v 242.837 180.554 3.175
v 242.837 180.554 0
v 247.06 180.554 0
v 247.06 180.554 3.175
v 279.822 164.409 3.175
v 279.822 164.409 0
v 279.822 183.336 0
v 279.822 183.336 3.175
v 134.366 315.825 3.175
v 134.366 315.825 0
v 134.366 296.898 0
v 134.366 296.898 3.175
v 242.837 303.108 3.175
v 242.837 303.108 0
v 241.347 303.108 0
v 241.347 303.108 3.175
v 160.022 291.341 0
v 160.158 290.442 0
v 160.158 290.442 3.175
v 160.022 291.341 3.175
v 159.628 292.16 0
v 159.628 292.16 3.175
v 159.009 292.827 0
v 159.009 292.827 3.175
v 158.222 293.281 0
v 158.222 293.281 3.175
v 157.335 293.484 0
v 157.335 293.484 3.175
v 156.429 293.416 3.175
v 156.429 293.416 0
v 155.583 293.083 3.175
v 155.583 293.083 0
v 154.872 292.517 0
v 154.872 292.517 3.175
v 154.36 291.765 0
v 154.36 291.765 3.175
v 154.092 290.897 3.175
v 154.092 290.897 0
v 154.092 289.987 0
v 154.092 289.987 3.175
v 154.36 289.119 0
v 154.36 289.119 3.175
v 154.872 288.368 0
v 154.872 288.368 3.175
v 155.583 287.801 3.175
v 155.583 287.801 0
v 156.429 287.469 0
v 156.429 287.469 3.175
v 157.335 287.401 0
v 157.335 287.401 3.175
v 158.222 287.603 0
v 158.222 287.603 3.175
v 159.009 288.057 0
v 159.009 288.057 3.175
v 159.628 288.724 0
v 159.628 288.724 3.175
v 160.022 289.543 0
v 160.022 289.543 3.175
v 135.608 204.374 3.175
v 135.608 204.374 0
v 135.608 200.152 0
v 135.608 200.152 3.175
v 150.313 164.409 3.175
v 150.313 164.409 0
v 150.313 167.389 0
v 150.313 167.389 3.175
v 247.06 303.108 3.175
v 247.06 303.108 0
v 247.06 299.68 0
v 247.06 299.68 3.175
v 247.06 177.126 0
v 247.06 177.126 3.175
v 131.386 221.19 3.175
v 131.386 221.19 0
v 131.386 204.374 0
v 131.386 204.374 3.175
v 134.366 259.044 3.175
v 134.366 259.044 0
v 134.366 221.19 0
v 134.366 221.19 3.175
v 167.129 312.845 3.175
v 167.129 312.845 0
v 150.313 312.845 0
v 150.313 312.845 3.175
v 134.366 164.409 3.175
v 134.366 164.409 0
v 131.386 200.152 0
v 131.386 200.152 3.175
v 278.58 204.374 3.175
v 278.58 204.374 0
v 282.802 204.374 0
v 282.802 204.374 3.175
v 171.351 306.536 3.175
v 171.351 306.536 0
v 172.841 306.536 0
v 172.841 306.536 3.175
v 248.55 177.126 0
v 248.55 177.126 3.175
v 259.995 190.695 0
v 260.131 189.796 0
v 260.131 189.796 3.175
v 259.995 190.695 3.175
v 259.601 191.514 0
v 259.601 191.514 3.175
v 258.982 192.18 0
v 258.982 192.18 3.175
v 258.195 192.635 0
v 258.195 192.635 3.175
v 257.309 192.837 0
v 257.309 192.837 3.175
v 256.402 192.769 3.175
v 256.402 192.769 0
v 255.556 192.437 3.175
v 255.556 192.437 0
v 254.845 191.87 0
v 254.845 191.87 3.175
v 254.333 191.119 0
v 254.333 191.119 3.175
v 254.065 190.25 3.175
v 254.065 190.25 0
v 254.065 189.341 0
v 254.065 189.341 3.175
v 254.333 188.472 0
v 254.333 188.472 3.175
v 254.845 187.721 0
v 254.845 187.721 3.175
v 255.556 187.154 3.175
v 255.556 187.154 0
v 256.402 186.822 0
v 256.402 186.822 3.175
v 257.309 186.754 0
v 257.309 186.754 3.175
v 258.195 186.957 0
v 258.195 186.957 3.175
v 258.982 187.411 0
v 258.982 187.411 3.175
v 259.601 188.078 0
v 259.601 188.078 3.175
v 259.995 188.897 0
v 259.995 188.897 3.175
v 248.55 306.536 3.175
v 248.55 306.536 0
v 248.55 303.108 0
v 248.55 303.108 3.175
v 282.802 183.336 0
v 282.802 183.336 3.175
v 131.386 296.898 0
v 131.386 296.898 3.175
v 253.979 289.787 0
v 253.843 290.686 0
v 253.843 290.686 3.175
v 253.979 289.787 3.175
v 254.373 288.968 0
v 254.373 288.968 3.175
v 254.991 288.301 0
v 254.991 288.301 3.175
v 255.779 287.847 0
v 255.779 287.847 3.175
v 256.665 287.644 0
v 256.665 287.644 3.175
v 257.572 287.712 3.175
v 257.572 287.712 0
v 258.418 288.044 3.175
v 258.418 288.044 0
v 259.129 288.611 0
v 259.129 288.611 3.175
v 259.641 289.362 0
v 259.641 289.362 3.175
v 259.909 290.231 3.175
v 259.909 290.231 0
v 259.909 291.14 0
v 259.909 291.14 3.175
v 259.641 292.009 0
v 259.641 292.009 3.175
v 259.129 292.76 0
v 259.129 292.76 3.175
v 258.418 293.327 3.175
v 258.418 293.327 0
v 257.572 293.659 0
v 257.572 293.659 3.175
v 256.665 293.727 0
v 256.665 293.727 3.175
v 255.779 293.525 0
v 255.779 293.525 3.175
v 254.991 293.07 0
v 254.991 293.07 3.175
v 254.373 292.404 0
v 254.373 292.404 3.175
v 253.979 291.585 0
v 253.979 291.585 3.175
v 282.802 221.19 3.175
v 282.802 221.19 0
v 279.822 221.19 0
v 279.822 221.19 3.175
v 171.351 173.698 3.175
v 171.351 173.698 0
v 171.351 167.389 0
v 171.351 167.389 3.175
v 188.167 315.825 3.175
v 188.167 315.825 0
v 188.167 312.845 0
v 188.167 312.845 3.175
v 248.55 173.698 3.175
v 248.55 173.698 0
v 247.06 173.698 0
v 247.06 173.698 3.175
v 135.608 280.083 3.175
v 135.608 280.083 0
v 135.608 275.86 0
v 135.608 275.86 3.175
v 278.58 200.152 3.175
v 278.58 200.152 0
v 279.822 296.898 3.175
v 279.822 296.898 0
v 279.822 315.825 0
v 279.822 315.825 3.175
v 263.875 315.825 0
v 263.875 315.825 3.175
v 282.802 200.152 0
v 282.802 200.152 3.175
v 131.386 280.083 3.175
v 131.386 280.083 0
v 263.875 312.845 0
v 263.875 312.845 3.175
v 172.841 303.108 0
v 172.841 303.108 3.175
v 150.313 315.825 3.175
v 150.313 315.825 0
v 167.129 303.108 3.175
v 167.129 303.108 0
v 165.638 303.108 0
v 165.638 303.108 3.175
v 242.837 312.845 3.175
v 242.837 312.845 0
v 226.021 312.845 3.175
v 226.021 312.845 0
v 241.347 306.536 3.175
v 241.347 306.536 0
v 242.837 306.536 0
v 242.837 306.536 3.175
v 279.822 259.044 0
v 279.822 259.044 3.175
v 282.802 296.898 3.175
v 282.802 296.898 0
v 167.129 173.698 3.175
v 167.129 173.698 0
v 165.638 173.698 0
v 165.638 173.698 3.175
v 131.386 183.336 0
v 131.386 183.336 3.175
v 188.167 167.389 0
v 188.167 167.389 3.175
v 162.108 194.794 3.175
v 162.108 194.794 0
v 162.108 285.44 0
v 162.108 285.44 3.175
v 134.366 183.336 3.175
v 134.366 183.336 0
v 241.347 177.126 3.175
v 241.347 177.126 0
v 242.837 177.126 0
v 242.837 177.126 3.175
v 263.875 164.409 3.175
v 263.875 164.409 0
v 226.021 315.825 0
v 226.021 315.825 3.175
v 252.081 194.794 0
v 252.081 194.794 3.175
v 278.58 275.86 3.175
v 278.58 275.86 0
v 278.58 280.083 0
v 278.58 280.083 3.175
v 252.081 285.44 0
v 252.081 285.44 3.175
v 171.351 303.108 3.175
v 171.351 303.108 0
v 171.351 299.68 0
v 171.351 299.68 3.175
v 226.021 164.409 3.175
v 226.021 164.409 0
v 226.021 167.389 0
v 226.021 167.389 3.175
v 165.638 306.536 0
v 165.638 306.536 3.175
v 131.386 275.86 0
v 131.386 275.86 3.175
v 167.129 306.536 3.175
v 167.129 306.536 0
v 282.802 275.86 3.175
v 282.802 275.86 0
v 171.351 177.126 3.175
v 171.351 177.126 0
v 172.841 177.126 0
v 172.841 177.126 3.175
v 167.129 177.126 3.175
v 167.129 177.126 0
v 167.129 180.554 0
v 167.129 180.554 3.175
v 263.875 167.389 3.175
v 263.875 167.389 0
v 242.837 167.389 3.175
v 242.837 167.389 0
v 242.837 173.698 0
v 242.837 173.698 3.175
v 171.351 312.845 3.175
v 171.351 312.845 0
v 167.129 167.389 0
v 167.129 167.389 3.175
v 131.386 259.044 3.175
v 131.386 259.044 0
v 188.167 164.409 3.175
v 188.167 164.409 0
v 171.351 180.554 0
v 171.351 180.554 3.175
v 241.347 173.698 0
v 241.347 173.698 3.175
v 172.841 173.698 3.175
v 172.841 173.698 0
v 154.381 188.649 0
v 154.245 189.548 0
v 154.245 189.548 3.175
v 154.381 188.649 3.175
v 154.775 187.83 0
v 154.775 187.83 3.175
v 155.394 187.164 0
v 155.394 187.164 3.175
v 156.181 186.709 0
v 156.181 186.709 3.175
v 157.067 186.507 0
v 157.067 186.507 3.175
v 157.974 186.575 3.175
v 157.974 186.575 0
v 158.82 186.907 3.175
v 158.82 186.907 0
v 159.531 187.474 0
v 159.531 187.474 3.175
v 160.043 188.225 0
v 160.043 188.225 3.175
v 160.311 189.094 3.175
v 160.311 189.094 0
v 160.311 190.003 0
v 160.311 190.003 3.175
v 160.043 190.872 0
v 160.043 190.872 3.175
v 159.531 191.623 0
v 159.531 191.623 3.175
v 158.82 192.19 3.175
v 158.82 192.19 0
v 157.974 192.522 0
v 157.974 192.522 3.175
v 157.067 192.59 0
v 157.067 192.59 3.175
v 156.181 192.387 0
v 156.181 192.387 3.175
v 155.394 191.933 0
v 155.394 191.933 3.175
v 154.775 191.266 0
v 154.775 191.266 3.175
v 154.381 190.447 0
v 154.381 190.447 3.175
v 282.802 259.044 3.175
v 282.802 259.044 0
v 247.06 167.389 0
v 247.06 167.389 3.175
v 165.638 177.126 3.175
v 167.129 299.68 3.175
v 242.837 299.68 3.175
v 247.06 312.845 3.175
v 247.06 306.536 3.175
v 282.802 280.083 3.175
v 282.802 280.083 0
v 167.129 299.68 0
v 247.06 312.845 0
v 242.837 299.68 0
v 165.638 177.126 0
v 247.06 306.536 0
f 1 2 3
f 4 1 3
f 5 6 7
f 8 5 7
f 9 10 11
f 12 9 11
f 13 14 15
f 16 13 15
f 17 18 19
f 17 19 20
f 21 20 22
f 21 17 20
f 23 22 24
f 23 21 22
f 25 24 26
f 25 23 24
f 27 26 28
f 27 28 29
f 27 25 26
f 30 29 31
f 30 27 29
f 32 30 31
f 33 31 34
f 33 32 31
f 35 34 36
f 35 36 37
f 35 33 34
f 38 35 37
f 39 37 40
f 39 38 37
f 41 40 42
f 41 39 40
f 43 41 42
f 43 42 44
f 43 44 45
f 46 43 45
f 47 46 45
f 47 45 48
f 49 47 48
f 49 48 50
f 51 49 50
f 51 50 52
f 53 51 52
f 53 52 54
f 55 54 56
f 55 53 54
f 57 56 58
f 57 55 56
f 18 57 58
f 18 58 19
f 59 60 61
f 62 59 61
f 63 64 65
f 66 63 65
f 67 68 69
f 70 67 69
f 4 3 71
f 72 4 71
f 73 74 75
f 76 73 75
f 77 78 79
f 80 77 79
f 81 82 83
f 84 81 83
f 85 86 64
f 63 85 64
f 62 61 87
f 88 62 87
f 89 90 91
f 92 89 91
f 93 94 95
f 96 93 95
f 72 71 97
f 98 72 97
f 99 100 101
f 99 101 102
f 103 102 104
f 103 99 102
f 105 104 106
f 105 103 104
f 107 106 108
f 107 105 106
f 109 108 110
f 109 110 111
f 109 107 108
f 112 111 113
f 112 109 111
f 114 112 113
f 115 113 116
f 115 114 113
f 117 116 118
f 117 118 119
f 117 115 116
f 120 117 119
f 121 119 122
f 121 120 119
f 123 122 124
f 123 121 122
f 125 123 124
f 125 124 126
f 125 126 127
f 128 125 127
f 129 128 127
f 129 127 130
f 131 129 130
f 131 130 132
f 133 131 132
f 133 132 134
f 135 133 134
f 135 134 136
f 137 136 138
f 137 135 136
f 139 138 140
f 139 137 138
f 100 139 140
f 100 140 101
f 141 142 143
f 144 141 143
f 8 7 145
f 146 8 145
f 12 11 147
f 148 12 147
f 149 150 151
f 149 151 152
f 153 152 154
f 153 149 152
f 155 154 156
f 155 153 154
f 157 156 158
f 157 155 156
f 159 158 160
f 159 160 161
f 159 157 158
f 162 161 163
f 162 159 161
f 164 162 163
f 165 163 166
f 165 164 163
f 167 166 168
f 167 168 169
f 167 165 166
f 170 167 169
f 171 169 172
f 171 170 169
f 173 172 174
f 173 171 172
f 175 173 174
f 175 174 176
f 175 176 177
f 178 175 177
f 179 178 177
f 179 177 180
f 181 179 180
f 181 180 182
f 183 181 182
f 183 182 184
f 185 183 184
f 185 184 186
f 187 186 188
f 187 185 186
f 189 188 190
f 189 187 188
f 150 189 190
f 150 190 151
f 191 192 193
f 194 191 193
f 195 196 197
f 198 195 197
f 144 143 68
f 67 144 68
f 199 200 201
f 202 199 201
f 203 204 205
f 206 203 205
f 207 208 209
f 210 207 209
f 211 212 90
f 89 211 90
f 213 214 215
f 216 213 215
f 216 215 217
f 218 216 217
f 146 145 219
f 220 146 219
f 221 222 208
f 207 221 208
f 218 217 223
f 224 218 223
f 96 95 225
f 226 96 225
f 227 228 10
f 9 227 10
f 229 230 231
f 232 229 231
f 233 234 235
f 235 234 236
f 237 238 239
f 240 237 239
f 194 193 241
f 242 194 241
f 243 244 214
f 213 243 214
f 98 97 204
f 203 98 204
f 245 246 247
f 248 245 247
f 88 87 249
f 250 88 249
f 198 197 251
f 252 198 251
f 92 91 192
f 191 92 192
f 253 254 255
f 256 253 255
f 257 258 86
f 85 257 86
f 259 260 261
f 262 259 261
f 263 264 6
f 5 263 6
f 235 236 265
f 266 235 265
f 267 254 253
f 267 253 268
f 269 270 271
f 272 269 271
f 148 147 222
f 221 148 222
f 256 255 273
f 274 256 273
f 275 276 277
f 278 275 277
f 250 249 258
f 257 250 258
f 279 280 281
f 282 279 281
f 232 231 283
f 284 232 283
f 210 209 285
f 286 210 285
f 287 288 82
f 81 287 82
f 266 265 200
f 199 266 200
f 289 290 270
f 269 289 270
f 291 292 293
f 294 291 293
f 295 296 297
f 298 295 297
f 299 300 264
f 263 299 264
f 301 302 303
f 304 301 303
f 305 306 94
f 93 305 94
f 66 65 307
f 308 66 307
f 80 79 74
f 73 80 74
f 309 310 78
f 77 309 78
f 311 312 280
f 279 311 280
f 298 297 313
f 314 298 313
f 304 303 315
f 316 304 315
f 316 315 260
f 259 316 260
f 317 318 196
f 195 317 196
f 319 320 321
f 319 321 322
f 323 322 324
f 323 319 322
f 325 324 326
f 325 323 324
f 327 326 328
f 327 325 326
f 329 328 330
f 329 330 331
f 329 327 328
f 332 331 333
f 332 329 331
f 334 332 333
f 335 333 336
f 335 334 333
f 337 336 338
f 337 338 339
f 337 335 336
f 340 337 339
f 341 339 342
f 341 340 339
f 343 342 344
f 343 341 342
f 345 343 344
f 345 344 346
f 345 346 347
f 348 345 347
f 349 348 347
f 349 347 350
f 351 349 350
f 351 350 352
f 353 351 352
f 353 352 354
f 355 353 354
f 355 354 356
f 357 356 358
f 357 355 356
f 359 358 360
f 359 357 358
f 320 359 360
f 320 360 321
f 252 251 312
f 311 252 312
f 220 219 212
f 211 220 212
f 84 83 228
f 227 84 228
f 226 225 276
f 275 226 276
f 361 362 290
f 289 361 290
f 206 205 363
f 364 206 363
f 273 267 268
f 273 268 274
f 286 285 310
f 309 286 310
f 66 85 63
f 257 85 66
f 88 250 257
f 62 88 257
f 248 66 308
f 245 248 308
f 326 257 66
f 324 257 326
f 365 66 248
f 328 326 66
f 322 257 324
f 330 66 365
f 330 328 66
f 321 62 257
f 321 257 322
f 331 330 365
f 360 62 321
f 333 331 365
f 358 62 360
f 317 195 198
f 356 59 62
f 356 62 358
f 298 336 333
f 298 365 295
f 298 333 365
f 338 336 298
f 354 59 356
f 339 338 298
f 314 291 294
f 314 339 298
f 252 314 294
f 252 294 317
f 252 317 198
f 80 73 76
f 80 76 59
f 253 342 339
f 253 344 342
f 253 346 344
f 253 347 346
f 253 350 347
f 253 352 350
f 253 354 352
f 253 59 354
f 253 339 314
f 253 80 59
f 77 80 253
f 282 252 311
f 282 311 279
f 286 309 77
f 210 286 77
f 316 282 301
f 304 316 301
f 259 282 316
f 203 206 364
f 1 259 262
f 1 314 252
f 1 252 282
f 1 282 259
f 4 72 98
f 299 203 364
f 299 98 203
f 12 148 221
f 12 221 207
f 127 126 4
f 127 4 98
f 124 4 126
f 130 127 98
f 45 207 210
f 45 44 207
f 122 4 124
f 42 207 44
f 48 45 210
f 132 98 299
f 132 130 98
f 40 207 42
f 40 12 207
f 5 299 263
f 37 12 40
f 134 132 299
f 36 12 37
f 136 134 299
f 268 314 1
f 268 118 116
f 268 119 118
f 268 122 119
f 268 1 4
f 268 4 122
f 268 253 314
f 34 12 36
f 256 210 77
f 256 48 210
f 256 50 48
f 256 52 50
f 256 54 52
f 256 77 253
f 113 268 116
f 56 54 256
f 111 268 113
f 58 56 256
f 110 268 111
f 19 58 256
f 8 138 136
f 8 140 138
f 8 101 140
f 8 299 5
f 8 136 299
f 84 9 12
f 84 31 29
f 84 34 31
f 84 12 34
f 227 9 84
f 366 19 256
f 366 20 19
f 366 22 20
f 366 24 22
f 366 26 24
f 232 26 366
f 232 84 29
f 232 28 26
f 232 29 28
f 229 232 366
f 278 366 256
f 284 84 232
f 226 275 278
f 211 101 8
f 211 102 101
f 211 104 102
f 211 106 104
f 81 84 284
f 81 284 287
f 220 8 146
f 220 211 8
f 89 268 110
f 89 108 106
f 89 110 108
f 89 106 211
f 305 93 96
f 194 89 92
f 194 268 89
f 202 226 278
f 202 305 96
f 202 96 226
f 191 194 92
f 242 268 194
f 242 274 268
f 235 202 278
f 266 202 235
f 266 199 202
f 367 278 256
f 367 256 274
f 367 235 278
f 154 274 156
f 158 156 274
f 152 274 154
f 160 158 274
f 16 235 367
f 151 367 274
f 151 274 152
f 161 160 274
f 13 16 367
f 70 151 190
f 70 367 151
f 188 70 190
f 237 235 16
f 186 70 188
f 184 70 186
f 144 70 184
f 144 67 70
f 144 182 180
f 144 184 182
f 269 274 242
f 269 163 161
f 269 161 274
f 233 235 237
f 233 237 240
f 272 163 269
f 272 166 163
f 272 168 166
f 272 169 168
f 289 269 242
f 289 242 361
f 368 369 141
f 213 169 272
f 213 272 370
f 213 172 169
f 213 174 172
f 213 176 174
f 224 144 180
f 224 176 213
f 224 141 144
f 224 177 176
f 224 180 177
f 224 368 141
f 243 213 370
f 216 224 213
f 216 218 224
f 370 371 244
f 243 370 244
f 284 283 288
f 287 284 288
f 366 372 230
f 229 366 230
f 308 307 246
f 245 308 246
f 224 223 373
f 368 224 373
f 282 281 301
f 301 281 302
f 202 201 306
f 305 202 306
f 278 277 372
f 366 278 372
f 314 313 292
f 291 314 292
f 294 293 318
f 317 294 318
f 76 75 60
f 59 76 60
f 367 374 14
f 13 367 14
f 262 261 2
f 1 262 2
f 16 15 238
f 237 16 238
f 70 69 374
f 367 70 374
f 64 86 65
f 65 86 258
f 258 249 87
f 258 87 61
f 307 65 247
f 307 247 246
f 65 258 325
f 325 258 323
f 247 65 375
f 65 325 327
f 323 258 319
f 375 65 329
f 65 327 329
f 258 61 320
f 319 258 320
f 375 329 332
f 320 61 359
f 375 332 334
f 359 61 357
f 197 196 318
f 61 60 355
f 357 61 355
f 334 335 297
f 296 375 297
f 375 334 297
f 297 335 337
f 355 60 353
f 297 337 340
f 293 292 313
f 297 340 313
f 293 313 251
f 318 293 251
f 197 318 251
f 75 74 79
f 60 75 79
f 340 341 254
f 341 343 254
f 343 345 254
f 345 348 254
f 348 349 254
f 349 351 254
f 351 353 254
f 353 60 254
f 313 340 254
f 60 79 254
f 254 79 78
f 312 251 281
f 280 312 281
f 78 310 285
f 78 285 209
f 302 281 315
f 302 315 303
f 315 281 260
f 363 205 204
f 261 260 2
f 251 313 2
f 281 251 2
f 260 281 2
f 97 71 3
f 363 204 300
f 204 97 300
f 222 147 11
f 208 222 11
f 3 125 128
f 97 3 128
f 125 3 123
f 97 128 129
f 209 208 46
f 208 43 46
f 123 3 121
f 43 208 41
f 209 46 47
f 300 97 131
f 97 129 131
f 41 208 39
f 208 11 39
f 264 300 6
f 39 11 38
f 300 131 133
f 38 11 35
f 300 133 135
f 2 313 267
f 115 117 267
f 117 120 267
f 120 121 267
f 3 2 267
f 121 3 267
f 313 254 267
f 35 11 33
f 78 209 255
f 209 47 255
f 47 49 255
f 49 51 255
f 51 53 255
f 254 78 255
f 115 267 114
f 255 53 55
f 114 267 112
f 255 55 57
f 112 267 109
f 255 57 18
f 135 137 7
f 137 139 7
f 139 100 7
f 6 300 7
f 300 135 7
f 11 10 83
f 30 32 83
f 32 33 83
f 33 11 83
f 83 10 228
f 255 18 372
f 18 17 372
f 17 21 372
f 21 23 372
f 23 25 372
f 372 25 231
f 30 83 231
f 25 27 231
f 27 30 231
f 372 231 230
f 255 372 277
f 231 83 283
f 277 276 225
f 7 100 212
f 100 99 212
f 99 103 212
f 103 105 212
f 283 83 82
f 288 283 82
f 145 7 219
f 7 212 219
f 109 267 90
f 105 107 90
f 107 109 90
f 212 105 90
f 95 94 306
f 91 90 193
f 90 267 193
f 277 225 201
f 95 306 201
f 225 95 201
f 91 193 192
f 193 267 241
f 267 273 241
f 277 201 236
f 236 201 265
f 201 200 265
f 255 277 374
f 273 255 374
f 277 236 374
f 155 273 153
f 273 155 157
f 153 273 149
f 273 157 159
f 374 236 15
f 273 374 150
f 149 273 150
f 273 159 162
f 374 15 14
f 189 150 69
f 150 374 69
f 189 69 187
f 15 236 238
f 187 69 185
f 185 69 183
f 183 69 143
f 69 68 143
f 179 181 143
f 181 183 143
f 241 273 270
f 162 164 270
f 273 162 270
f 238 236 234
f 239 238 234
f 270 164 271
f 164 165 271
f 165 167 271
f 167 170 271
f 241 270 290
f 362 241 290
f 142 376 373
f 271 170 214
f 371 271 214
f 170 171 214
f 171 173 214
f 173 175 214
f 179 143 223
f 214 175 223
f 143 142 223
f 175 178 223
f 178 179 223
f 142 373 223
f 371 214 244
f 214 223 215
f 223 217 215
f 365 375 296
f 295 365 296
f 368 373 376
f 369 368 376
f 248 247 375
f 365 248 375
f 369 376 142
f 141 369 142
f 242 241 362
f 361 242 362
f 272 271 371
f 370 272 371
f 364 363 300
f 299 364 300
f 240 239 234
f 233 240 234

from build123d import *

# Parameters (mm, degrees)
SKETCH1_R           = 3.05
SKETCH1_W           = 89.973098966
SKETCH1_H           = 90.646237781
BOSS_EXTRUDE1_DEPTH = 3.175


with BuildPart() as part:
    # Sketch1 → Boss-Extrude1 (new body)
    with BuildSketch(Plane.XY):
        Polygon((134.366277122, 315.825463089), (134.366277122, 296.898356199), (131.385630367, 296.898356199), (131.385630367, 280.082540759), (135.608213269, 280.082540759), (135.608213269, 277.971249308), (135.608213269, 275.859957857), (131.385630367, 275.859957857), (131.385630367, 259.044142417), (134.366277122, 259.044142417), (134.366277122, 221.189928636), (131.385630367, 221.189928636), (131.385630367, 204.374113196), (135.608213269, 204.374113196), (135.608213269, 202.262821745), (135.608213269, 200.151530294), (131.385630367, 200.151530294), (131.385630367, 183.335714854), (134.366277122, 183.335714854), (134.366277122, 164.408607964), (150.312737258, 164.408607964), (150.312737258, 167.389254718), (167.128552698, 167.389254718), (167.128552698, 173.698290348), (165.63822932, 173.698290348), (165.63822932, 177.126034116), (167.128552698, 177.126034116), (167.128552698, 180.553777884), (171.3511356, 180.553777884), (171.3511356, 177.126034116), (172.841458977, 177.126034116), (172.841458977, 173.698290348), (171.3511356, 173.698290348), (171.3511356, 167.389254718), (188.166951039, 167.389254718), (188.166951039, 164.408607964), (226.021164821, 164.408607964), (226.021164821, 167.389254718), (242.83698026, 167.389254718), (242.83698026, 173.698290348), (241.346656883, 173.698290348), (241.346656883, 177.126034116), (242.83698026, 177.126034116), (242.83698026, 180.553777884), (247.059563162, 180.553777884), (247.059563162, 177.126034116), (248.54988654, 177.126034116), (248.54988654, 173.698290348), (247.059563162, 173.698290348), (247.059563162, 167.389254718), (263.875378602, 167.389254718), (263.875378602, 164.408607964), (279.821838738, 164.408607964), (279.821838738, 183.335714854), (282.802485493, 183.335714854), (282.802485493, 200.151530294), (278.579902591, 200.151530294), (278.579902591, 202.262821745), (278.579902591, 204.374113196), (282.802485493, 204.374113196), (282.802485493, 221.189928636), (279.821838738, 221.189928636), (279.821838738, 259.044142417), (282.802485493, 259.044142417), (282.802485493, 275.859957857), (278.579902591, 275.859957857), (278.579902591, 277.971249308), (278.579902591, 280.082540759), (282.802485493, 280.082540759), (282.802485493, 296.898356199), (279.821838738, 296.898356199), (279.821838738, 315.825463089), (263.875378602, 315.825463089), (263.875378602, 312.844816335), (247.059563162, 312.844816335), (247.059563162, 306.535780705), (248.54988654, 306.535780705), (248.54988654, 303.108036937), (247.059563162, 303.108036937), (247.059563162, 299.680293169), (242.83698026, 299.680293169), (242.83698026, 303.108036937), (241.346656883, 303.108036937), (241.346656883, 306.535780705), (242.83698026, 306.535780705), (242.83698026, 312.844816335), (226.021164821, 312.844816335), (226.021164821, 315.825463089), (188.166951039, 315.825463089), (188.166951039, 312.844816335), (171.3511356, 312.844816335), (171.3511356, 306.535780705), (172.841458977, 306.535780705), (172.841458977, 303.108036937), (171.3511356, 303.108036937), (171.3511356, 299.680293169), (167.128552698, 299.680293169), (167.128552698, 303.108036937), (165.63822932, 303.108036937), (165.63822932, 306.535780705), (167.128552698, 306.535780705), (167.128552698, 312.844816335), (150.312737258, 312.844816335), (150.312737258, 315.825463089), align=None)
        with Locations((157.107508447, 290.442033214)):
            Circle(SKETCH1_R, mode=Mode.SUBTRACT)
        with Locations(Location((256.893063872, 290.685795432, 0), (0, 0, 180))):
            Circle(SKETCH1_R, mode=Mode.SUBTRACT)
        with Locations((257.080607413, 189.795795432)):
            Circle(SKETCH1_R, mode=Mode.SUBTRACT)
        with Locations(Location((157.295282053, 189.548275621, 0), (0, 0, 180))):
            Circle(SKETCH1_R, mode=Mode.SUBTRACT)
        with Locations((207.09405793, 240.117035527)):
            Rectangle(SKETCH1_W, SKETCH1_H, mode=Mode.SUBTRACT)
    extrude(amount=BOSS_EXTRUDE1_DEPTH)


solid = part.part
